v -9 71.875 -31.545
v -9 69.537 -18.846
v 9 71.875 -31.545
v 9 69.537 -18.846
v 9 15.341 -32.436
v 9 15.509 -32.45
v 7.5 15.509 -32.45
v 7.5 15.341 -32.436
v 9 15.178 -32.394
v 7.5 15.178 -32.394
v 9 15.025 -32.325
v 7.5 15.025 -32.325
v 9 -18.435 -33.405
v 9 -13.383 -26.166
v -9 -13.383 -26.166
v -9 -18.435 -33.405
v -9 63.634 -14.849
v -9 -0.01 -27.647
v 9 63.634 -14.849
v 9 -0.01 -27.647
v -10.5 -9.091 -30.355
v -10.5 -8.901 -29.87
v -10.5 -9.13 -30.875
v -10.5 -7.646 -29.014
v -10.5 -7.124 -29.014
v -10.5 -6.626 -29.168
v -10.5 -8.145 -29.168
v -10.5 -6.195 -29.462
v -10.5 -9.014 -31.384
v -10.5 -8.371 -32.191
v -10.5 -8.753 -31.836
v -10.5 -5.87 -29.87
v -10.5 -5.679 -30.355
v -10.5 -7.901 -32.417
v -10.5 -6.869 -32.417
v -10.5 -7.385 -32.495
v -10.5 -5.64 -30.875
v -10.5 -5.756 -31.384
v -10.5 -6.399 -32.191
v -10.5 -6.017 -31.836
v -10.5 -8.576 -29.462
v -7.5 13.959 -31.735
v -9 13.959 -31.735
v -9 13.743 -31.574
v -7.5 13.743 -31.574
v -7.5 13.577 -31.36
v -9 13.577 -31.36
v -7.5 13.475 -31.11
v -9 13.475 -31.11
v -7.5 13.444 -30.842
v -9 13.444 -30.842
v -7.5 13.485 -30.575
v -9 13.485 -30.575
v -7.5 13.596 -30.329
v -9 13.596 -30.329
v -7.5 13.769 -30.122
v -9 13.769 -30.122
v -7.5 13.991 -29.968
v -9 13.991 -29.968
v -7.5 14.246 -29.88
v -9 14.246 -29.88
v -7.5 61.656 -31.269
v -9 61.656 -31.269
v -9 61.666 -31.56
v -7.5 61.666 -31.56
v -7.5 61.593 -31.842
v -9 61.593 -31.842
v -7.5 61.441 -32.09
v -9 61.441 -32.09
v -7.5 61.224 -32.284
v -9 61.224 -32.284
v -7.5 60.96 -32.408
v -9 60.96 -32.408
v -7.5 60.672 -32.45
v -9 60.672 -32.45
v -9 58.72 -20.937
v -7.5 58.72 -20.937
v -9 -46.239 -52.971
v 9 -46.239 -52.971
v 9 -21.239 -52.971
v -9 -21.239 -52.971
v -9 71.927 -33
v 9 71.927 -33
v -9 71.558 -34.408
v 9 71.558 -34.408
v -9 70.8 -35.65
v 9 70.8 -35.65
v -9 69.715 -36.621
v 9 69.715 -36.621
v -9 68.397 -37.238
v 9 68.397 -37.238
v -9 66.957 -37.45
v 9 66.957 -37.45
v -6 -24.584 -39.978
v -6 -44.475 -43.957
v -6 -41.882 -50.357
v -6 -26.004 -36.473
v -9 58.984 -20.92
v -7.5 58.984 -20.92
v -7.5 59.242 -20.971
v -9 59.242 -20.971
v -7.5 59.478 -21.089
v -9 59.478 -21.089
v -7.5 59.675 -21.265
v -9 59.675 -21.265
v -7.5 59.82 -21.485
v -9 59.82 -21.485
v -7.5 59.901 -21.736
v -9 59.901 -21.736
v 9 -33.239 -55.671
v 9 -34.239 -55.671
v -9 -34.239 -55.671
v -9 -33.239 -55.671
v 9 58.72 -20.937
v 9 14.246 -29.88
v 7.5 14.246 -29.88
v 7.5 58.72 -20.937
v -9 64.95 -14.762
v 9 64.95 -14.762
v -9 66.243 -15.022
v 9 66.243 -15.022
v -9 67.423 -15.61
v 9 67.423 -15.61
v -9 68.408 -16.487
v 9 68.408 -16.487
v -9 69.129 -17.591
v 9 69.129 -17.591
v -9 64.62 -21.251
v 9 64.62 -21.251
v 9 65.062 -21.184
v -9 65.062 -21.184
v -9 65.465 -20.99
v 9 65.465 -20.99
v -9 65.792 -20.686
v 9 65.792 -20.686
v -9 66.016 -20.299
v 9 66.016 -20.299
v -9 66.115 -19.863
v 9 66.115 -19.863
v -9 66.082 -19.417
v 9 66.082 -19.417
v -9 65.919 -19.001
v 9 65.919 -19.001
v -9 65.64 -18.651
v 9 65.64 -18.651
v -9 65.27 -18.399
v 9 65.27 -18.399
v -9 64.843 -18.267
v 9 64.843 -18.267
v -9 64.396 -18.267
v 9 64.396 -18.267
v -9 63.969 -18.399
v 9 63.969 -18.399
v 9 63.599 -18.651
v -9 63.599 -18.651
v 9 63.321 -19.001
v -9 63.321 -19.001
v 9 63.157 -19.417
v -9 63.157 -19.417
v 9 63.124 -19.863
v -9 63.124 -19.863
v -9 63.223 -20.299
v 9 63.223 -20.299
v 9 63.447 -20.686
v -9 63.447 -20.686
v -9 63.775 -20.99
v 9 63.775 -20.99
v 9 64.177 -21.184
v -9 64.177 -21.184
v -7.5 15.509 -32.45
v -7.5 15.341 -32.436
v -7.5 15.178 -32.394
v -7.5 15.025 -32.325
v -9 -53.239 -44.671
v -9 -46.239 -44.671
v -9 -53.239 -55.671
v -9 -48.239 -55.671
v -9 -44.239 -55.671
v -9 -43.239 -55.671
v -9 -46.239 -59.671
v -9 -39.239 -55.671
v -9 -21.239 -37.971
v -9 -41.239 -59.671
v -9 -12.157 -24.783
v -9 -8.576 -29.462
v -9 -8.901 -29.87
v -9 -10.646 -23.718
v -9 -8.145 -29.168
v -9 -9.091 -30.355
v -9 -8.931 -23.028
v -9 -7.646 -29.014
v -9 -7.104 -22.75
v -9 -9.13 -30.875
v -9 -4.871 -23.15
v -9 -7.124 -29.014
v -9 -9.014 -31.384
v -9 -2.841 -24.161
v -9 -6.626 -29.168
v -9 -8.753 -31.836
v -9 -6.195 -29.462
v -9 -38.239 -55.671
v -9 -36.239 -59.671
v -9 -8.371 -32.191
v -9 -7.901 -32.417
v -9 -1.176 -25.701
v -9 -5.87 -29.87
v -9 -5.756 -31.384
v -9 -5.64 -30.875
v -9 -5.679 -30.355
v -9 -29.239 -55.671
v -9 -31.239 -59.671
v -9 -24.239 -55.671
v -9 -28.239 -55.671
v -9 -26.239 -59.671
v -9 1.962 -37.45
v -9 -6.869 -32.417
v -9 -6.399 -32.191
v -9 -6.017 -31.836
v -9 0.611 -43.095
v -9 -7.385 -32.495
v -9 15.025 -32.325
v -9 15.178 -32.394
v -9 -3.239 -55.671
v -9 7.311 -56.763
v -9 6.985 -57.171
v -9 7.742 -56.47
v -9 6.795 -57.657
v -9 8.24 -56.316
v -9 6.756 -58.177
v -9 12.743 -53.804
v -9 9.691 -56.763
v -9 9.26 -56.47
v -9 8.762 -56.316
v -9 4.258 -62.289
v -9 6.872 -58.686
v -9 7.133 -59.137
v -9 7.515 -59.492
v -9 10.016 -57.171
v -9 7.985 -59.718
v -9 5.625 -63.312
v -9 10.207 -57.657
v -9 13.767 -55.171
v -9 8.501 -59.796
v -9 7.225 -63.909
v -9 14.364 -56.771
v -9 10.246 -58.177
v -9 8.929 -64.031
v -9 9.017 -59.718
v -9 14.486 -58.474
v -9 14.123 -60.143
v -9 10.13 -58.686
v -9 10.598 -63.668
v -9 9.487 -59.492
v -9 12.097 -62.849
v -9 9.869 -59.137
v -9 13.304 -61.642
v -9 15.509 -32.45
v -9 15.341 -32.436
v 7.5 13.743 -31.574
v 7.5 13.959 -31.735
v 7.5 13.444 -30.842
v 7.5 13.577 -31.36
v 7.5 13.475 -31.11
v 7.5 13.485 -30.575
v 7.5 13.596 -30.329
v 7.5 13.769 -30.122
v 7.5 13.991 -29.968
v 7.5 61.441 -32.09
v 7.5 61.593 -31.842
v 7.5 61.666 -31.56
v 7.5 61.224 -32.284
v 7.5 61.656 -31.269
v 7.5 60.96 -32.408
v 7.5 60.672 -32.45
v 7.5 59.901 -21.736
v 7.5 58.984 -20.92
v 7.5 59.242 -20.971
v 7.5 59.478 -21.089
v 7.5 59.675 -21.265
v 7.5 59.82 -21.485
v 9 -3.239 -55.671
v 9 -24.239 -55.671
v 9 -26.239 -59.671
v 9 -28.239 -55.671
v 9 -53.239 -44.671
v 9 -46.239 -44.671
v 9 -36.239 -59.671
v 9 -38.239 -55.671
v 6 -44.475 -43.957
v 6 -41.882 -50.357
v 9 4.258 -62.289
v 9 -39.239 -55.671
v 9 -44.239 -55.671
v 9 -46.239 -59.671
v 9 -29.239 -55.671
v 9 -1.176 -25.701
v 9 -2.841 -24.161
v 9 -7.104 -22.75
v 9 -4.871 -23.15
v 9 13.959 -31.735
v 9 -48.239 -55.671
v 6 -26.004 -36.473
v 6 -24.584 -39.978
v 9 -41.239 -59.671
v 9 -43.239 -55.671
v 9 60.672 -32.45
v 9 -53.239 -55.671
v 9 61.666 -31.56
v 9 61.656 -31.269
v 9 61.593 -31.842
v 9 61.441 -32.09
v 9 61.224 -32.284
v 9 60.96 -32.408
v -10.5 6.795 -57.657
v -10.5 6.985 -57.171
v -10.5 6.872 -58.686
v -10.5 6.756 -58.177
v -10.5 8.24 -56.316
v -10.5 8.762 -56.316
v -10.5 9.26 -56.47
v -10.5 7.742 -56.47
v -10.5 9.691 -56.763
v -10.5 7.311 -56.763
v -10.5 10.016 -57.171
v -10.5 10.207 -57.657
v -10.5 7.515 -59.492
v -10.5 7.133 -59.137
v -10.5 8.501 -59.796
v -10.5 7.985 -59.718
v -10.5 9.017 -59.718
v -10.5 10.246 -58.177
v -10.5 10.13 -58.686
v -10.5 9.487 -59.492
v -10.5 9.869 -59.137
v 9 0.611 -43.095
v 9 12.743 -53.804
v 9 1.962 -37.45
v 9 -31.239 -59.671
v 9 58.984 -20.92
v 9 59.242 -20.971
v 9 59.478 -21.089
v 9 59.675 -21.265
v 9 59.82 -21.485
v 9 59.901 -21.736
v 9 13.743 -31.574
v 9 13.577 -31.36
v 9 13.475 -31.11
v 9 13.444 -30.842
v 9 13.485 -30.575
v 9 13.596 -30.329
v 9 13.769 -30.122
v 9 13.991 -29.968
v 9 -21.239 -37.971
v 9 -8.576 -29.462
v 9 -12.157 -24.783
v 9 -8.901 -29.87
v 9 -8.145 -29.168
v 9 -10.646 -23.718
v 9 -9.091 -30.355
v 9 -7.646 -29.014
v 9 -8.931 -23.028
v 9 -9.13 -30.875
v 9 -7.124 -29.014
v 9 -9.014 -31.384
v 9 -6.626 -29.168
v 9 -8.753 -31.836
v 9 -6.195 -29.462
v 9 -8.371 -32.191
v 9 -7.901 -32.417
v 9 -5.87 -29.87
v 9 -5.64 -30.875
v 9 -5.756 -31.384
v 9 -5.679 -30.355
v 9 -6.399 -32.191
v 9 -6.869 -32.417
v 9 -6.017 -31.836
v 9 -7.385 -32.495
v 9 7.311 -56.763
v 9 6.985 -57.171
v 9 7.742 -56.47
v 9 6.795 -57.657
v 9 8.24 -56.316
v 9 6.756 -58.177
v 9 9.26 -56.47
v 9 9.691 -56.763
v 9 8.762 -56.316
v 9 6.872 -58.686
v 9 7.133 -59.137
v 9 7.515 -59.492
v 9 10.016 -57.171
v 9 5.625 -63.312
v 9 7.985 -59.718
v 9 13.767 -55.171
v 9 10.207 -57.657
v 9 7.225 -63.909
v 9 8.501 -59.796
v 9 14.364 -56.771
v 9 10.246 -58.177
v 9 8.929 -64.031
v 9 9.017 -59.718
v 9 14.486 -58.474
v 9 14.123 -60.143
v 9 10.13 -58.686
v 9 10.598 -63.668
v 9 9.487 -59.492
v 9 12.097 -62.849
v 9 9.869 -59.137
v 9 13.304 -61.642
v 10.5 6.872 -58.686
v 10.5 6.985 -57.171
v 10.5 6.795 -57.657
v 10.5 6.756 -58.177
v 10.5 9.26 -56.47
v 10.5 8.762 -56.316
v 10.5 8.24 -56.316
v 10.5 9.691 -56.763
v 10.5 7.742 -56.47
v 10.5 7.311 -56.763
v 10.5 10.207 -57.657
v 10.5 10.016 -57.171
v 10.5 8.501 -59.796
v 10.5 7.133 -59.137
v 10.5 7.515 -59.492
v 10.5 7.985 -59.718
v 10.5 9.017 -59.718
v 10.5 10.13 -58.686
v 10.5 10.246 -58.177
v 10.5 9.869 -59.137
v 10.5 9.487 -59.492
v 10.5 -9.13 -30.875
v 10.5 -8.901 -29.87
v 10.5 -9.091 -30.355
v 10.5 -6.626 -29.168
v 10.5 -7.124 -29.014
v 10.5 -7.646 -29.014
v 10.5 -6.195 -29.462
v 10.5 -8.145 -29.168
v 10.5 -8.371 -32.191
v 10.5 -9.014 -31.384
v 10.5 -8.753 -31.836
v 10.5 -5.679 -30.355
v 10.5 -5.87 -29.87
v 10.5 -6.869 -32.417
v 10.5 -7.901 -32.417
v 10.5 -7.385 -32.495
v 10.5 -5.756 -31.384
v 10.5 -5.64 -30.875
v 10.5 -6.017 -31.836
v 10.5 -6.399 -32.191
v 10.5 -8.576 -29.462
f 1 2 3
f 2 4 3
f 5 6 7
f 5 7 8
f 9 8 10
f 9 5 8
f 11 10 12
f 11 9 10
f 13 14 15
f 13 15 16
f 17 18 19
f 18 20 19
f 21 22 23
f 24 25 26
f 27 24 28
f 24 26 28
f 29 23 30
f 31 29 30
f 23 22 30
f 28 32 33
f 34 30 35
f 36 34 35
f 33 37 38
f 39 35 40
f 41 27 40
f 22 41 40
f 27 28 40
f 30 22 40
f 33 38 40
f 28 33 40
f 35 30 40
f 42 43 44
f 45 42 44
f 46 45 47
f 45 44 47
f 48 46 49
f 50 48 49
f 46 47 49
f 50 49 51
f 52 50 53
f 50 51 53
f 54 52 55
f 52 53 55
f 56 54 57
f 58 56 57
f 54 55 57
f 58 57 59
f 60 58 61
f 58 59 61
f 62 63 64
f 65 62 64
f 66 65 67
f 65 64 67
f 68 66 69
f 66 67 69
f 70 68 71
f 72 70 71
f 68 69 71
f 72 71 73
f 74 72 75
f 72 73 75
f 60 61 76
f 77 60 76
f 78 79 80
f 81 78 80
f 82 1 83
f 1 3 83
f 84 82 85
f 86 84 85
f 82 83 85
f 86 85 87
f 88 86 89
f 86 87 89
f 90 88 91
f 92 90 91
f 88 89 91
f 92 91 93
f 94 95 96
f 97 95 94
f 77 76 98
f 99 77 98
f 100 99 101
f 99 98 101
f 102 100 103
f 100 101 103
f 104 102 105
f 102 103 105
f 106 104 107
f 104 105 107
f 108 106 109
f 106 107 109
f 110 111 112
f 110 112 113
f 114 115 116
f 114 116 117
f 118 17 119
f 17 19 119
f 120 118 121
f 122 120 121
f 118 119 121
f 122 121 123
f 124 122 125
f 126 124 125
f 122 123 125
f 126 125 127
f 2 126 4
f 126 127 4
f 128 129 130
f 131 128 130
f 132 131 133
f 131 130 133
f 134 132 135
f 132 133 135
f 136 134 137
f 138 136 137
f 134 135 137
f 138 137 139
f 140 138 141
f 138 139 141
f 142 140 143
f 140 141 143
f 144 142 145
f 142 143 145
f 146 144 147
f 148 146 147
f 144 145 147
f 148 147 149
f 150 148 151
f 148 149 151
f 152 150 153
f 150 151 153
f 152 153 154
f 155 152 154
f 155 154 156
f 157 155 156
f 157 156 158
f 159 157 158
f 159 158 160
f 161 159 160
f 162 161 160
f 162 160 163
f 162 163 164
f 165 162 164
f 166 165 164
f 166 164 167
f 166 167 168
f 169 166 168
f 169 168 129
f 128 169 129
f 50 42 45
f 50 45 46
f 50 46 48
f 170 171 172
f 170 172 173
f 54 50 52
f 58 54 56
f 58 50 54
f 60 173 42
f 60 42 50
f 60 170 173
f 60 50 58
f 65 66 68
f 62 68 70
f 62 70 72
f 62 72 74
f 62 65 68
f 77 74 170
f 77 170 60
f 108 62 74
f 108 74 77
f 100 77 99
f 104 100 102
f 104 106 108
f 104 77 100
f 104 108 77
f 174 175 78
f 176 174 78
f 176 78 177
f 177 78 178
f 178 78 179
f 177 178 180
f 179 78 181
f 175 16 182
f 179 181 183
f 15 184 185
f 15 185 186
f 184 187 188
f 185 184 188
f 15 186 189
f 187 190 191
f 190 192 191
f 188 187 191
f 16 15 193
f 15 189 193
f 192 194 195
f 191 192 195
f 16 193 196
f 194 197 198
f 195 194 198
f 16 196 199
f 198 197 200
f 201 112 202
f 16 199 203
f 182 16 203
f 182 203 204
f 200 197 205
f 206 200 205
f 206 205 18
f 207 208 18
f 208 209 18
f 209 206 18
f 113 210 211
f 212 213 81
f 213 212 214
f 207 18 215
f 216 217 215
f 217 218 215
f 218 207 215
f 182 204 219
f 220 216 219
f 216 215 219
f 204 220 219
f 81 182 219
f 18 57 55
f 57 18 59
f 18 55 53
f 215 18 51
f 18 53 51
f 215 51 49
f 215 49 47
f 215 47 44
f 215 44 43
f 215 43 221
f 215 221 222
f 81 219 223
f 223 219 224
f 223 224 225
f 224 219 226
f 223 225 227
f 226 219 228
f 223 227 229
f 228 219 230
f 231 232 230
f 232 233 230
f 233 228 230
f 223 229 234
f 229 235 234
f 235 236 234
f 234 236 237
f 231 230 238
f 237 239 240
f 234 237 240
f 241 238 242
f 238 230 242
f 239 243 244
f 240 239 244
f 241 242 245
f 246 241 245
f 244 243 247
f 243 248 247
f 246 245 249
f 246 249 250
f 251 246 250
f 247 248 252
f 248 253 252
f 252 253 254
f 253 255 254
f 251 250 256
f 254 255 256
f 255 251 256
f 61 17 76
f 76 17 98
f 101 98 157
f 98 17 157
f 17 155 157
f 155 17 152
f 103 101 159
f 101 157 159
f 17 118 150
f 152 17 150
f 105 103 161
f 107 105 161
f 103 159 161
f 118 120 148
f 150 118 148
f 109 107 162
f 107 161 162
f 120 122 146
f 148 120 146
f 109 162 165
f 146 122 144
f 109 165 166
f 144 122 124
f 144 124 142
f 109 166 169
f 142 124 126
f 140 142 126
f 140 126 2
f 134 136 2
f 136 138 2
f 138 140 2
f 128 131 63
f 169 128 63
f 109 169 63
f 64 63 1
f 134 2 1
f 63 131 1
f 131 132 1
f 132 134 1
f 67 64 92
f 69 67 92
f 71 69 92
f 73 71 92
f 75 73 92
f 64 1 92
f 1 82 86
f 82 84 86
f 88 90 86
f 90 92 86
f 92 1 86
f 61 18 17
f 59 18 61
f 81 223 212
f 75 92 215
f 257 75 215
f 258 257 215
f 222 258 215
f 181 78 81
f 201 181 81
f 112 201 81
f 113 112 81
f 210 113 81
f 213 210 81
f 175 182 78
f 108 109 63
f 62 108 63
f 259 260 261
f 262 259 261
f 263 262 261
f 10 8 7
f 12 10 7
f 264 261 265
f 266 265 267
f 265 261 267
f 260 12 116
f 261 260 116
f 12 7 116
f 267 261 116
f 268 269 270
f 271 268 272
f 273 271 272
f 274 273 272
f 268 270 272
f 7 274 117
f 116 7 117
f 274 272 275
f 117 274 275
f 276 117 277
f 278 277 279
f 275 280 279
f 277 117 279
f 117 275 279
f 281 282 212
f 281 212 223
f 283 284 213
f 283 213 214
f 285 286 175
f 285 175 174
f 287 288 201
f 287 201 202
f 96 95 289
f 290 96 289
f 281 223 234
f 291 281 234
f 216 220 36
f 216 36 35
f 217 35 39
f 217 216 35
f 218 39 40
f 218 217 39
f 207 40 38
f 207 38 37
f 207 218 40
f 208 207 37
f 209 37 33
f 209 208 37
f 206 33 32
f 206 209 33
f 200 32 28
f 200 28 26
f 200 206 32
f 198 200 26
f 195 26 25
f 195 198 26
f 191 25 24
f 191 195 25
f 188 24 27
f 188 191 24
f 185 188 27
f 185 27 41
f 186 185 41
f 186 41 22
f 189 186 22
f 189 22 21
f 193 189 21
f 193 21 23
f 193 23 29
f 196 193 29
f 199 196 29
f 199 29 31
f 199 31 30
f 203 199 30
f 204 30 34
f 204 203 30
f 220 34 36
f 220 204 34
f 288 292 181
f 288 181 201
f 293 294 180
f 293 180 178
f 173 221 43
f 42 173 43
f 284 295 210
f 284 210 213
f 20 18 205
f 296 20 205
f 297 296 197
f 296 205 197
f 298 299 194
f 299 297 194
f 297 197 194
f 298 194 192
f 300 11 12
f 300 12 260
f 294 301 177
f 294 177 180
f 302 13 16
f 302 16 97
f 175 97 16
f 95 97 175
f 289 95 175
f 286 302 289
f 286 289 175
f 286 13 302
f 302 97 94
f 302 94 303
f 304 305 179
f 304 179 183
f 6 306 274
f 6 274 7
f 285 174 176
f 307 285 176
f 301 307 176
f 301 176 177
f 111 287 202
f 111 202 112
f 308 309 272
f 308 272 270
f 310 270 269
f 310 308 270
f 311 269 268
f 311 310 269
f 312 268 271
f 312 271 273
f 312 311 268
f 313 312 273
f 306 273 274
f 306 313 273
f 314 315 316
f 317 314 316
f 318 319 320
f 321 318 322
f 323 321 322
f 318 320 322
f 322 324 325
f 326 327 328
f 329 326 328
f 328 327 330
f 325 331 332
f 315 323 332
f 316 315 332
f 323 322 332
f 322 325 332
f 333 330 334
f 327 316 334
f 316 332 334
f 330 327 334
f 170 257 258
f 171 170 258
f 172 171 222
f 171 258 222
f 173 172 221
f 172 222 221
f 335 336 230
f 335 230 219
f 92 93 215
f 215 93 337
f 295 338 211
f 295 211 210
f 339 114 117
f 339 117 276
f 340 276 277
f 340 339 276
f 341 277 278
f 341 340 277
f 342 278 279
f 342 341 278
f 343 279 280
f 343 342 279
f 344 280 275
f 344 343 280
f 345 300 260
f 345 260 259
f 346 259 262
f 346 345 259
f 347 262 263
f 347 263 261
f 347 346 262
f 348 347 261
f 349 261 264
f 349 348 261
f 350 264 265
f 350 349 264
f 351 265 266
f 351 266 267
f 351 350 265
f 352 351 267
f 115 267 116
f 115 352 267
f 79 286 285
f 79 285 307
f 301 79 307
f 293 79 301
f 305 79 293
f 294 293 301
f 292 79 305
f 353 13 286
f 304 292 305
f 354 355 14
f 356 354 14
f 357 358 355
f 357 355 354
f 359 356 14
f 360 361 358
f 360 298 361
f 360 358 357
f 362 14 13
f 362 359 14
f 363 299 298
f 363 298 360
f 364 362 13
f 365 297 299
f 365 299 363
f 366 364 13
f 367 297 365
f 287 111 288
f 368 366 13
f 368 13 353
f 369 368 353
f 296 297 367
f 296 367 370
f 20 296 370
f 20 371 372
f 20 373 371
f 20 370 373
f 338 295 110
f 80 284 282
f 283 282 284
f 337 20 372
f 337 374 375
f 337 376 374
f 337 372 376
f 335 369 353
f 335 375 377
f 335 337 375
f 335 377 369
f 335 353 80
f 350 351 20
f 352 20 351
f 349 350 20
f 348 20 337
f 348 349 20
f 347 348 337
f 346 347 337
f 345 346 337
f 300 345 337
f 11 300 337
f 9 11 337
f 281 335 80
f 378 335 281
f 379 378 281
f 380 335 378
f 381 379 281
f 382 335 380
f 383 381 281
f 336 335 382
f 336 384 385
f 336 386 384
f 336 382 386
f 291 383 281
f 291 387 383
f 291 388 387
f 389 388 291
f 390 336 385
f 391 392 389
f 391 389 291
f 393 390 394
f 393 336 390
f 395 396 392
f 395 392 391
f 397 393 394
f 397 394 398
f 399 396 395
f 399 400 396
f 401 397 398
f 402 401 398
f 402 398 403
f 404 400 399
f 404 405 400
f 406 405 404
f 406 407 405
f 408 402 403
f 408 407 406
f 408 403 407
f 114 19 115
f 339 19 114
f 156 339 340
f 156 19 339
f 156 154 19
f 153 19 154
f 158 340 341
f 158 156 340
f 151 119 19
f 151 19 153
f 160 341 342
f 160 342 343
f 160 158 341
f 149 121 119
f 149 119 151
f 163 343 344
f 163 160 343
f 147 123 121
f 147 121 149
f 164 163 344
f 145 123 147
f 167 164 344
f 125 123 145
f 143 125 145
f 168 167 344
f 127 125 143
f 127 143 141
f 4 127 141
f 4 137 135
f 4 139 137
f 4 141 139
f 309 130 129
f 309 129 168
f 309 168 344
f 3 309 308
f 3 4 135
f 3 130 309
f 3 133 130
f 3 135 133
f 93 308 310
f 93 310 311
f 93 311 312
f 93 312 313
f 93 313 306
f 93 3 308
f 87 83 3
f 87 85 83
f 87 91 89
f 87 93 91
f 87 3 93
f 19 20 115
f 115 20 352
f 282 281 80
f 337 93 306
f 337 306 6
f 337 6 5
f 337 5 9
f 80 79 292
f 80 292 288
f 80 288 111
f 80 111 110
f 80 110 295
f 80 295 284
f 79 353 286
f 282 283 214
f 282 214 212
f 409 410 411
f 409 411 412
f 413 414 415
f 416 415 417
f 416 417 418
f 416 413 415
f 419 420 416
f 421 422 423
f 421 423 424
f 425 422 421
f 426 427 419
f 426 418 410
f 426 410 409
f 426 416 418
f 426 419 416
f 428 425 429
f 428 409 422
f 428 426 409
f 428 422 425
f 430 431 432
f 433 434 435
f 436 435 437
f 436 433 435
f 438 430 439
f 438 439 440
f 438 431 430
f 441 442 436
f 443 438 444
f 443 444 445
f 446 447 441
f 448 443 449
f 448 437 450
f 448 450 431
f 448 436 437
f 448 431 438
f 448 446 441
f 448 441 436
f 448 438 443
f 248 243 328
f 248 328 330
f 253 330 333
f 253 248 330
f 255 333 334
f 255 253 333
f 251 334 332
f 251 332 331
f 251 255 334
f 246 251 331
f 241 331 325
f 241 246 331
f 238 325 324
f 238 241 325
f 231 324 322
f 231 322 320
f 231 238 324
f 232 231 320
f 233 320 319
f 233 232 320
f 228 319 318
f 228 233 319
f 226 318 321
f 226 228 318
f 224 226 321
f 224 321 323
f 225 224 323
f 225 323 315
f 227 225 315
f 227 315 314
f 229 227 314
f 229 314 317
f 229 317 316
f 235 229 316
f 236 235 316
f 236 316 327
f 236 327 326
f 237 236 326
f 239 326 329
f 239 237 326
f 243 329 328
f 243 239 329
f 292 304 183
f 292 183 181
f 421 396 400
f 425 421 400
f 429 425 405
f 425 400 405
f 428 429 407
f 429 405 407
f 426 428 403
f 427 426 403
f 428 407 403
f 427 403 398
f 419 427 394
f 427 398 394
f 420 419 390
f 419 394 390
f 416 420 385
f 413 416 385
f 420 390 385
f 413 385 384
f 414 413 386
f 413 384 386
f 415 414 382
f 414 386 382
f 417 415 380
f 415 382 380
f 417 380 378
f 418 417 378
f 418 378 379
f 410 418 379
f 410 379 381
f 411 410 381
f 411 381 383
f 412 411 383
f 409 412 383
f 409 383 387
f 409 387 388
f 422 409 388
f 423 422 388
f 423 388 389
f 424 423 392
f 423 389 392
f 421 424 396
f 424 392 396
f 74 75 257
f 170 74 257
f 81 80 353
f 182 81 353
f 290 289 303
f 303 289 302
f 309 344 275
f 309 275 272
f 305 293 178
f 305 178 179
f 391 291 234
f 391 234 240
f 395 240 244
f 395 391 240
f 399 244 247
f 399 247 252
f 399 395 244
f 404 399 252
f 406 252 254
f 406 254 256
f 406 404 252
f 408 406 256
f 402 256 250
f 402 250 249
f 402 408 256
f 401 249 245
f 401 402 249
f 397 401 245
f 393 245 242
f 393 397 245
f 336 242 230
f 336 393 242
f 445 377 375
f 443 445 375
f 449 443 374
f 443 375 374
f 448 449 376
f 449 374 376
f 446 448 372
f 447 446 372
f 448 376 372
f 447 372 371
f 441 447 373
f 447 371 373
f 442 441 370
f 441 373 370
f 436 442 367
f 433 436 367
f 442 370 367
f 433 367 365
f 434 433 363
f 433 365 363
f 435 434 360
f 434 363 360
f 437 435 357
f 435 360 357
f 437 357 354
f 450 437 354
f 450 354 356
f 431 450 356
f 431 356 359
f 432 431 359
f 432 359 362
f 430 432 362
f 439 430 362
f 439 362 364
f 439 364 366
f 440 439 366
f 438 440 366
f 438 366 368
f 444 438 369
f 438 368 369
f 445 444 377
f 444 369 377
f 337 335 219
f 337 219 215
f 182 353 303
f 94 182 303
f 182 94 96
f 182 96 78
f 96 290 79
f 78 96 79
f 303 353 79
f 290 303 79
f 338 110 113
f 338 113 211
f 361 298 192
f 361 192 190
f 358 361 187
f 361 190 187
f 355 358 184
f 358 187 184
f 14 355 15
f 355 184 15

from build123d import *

# Parameters (mm, degrees)
BOSS_EXTRUDE1_DEPTH = 9
CUT_EXTRUDE1_DEPTH  = 25
BOSS_EXTRUDE2_DEPTH = 18
LPATTERN1_COUNT     = 5
LPATTERN1_PITCH     = 5
FILLET1_R           = 8
FILLET2_R           = 5
SKETCH5_R           = 1.5
CUT_EXTRUDE2_DEPTH  = 25
SKETCH8_W           = 12
SKETCH8_H           = 19.929795107
CUT_EXTRUDE4_DEPTH  = 8
SKETCH9_R           = 1.75
BOSS_EXTRUDE3_DEPTH = 1.5
SKETCH10_R          = 1.75
BOSS_EXTRUDE4_DEPTH = 1.5
CUT_EXTRUDE6_DEPTH  = 1.5


with BuildPart() as part:
    # Sketch1 → Boss-Extrude1 (new, symmetric)
    with BuildSketch(Plane(origin=(0, 0, 0), x_dir=(0, 0, -1), z_dir=(1, 0, 0))):
        Polygon((55.671385575, -3.239060519), (62.288855516, 4.258211757), (53.803574142, 12.743493131), (43.094739802, 0.610903558), (37.450270875, 1.961830752), (27.646512788, -0.009546276), (22.744633745, -0.995234789), (22.744633745, -10.995234789), (33.405472618, -18.4347586), (44.671385575, -46.239060519), (44.671385575, -53.239060519), (55.671385575, -53.239060519), align=None)
        Polygon((37.450270875, 1.961830752), (27.646512788, -0.009546276), (13.846873598, 68.616760329), (37.450270875, 72.961830752), align=None)
        with BuildLine():
            ThreePointArc((62.288855516, 4.258211757), (62.288855516, 12.743493131), (53.803574142, 12.743493131))
            Line((53.803574142, 12.743493131), (62.288855516, 4.258211757))
        make_face()
    extrude(amount=BOSS_EXTRUDE1_DEPTH, both=True)

    # Sketch3 → Cut-Extrude1 (cut)
    with BuildSketch(Plane(origin=(9, 0, 0), x_dir=(0, 0, -1), z_dir=(1, 0, 0))):
        Polygon((52.971385575, -46.239060519), (52.971385575, -21.239060519), (37.971385575, -21.239060519), align=None)
    extrude(amount=-CUT_EXTRUDE1_DEPTH, mode=Mode.SUBTRACT)

    # Sketch4 → Boss-Extrude2 (add)
    with BuildSketch(Plane(origin=(9, 0, 0), x_dir=(0, 0, -1), z_dir=(1, 0, 0))):
        Polygon((55.671385575, -44.239060519), (55.671385575, -46.239060519), (59.671385575, -46.239060519), align=None)
        Polygon((59.671385575, -46.239060519), (55.671385575, -46.239060519), (55.671385575, -48.239060519), align=None)
    boss_extrude2 = extrude(amount=-BOSS_EXTRUDE2_DEPTH)

    # LPattern1: Boss-Extrude2 ×5
    with Locations(*[(0, i * LPATTERN1_PITCH, 0) for i in range(1, LPATTERN1_COUNT)]):
        add(boss_extrude2)

    # Fillet1
    # the kernel refuses this fillet: 8 mm, written as the material it takes off along each edge
    with BuildSketch(Plane(origin=(-19.431592215, -10.995234789, -22.744633745), x_dir=(0, 1, 0), z_dir=(1, 0, 0))) as fillet1_piece_1:
        with BuildLine():
            CenterArc((FILLET1_R * 0.521579610744, -FILLET1_R), FILLET1_R, 90, 55.091253842)
            Line((-FILLET1_R * 0.298484917938, -FILLET1_R * 0.427728937655), (-FILLET1_R * 0.314886208512, -FILLET1_R * 0.416283516408))
            Line((-FILLET1_R * 0.314886208512, -FILLET1_R * 0.416283516408), (-FILLET1_R * 0.0104315922149, FILLET1_R * 0.02))
            Line((-FILLET1_R * 0.0104315922149, FILLET1_R * 0.02), (FILLET1_R * 0.521579610744, FILLET1_R * 0.02))
            Line((FILLET1_R * 0.521579610744, FILLET1_R * 0.02), (FILLET1_R * 0.521579610744, 0))
        make_face()
    extrude(amount=38.86318443, mode=Mode.SUBTRACT)
    with BuildSketch(Plane(origin=(-24.975146678, -0.995234789, -22.744633745), x_dir=(0, 0.1971377027252409, -0.9803758086388171), z_dir=(1, 0, 0))) as fillet1_piece_2:
        with BuildLine():
            CenterArc((6.583284982, -7.841760559), FILLET1_R, 101.414804466, 67.215566165)
            Line((-1.259721487, -6.264658937), (-1.416581616, -6.233116905))
            Line((-1.416581616, -6.233116905), (-0.156860129, 0.031542032))
            Line((-0.156860129, 0.031542032), (0, 0.16))
            ThreePointArc((0, 0.16), (2.5, 0.16), (4.9683343, 0.156835211))
            Line((4.9683343, 0.156835211), (5, 0))
        make_face()
    extrude(amount=49.950293357, mode=Mode.SUBTRACT)

    # Fillet2
    fillet2_edges = [part.edges().sort_by_distance(p)[0] for p in [
        (0, 68.616760329, -13.846873598),
        (0, 72.961830752, -37.450270875),
    ]]
    fillet(fillet2_edges, radius=FILLET2_R)

    # Sketch5 → Cut-Extrude2 (cut)
    with BuildSketch(Plane(origin=(9, 0, 0), x_dir=(0, 0, -1), z_dir=(1, 0, 0))):
        with Locations((19.750729409, 64.619567483)):
            Circle(SKETCH5_R)
    extrude(amount=-CUT_EXTRUDE2_DEPTH, mode=Mode.SUBTRACT)

    # Sketch8 → Cut-Extrude4 (cut)
    with BuildSketch(Plane(origin=(0, 9.02689363, -22.278396507), x_dir=(1, 0, 0), z_dir=(0, -0.3755304319039708, 0.926810063990469))):
        with Locations((0, -47.762420436)):
            Rectangle(SKETCH8_W, SKETCH8_H)
    extrude(amount=-CUT_EXTRUDE4_DEPTH, mode=Mode.SUBTRACT)

    # Sketch9 → Boss-Extrude3 (add)
    with BuildSketch(Plane(origin=(9, 0, 0), x_dir=(0, 0, -1), z_dir=(1, 0, 0))):
        with Locations((58.046214829, 8.500852444)):
            Circle(SKETCH9_R)
    boss_extrude3 = extrude(amount=BOSS_EXTRUDE3_DEPTH)

    # Sketch10 → Boss-Extrude4 (add)
    with BuildSketch(Plane(origin=(9, 0, 0), x_dir=(0, 0, -1), z_dir=(1, 0, 0))):
        with Locations((30.744633745, -7.385293461)):
            Circle(SKETCH10_R)
    boss_extrude4 = extrude(amount=BOSS_EXTRUDE4_DEPTH)

    # Sketch11 → Cut-Extrude6 (cut)
    with BuildSketch(Plane(origin=(9, 0, 0), x_dir=(0, 0, -1), z_dir=(1, 0, 0))):
        with BuildLine():
            Line((32.450270875, 60.672480234), (32.450270875, 15.509128812))
            ThreePointArc((32.450270875, 15.509128812), (32.418490768, 15.259028355), (32.325170397, 15.024824336))
            Line((32.325170397, 15.024824336), (31.735253047, 13.959134396))
            ThreePointArc((31.735253047, 13.959134396), (30.707391109, 13.455206865), (29.879977716, 14.246301169))
            Line((29.879977716, 14.246301169), (20.936945668, 58.720453776))
            ThreePointArc((20.936945668, 58.720453776), (21.089259967, 59.478228738), (21.736276876, 59.901066366))
            Line((21.736276876, 59.901066366), (31.269226274, 61.655955121))
            ThreePointArc((31.269226274, 61.655955121), (32.09017532, 61.440934723), (32.450270875, 60.672480234))
        make_face()
    cut_extrude6 = extrude(amount=-CUT_EXTRUDE6_DEPTH, mode=Mode.SUBTRACT)

    # Mirror1: Boss-Extrude3, Boss-Extrude4, Cut-Extrude6 across plane
    add(boss_extrude3.mirror(Plane(origin=(0, 0, 0), x_dir=(0, 0, 1), z_dir=(1, 0, 0))))
    add(boss_extrude4.mirror(Plane(origin=(0, 0, 0), x_dir=(0, 0, 1), z_dir=(1, 0, 0))))
    add(cut_extrude6.mirror(Plane(origin=(0, 0, 0), x_dir=(0, 0, 1), z_dir=(1, 0, 0))), mode=Mode.SUBTRACT)


solid = part.part
